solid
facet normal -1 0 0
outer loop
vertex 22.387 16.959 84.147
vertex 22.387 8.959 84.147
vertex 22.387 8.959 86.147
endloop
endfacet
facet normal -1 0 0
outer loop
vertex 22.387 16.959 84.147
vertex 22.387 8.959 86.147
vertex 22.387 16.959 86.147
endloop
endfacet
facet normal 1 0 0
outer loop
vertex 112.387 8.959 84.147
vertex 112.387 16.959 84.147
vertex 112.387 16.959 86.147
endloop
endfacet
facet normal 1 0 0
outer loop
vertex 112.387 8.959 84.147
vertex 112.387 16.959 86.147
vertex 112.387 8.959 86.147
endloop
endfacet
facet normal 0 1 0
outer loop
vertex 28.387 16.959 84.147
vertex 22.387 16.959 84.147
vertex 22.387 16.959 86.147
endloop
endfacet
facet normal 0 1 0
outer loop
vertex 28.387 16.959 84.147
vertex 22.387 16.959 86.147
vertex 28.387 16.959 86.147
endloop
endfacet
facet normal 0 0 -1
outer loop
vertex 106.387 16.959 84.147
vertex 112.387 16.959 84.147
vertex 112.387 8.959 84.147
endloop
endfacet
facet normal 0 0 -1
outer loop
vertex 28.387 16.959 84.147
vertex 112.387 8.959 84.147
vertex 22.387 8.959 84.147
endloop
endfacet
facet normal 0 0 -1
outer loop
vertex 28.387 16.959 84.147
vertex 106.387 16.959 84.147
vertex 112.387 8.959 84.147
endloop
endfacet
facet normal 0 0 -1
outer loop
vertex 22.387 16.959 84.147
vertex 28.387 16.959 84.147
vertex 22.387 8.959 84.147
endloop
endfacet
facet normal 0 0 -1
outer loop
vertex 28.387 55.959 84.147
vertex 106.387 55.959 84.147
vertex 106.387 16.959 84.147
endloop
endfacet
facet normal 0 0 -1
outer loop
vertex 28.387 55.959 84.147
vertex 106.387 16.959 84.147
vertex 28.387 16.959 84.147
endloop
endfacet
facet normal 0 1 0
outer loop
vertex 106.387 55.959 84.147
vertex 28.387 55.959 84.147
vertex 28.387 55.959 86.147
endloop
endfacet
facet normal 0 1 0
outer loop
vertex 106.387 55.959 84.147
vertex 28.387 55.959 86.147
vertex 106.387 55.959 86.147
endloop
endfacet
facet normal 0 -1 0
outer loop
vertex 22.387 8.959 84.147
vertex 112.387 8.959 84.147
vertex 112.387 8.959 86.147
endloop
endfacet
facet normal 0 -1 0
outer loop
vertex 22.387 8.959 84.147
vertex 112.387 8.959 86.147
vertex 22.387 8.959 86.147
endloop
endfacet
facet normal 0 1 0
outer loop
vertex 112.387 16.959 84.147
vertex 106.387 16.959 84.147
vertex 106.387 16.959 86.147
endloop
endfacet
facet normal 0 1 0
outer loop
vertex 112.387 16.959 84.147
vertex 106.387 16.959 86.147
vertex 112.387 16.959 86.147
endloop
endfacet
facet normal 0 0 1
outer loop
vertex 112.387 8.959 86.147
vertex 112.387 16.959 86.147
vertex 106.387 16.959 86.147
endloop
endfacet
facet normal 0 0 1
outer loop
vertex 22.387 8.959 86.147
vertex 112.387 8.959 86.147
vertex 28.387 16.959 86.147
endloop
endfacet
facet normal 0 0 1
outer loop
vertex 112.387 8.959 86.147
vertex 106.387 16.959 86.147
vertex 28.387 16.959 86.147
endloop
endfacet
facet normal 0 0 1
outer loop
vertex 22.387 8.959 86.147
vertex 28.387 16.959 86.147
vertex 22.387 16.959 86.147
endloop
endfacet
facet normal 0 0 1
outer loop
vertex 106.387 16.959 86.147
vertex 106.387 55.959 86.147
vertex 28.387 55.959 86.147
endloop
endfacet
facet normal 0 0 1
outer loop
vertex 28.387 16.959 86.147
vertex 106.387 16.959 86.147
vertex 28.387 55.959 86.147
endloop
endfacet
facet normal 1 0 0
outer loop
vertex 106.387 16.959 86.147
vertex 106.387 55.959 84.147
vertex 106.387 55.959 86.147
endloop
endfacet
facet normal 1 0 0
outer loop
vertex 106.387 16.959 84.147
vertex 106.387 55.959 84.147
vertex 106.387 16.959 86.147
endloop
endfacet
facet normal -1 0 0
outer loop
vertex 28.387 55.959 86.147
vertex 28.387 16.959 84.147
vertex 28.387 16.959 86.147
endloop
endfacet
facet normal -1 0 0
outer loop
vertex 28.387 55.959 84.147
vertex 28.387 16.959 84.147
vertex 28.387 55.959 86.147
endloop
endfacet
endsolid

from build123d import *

# Parameters (mm, degrees)
PAD_DEPTH = 2


with BuildPart() as part:
    # Sketch (on Face1 of CopyPad007) → Pad (new body)
    with BuildSketch(Plane.XY.offset(82)):
        Polygon((15, 4), (15, 12), (21, 12), (21, 51), (99, 51), (99, 12), (105, 12), (105, 4), align=None)
    extrude(amount=PAD_DEPTH)


with BuildPart() as part_1:
    # Body001 placement: moved
    add(part.part.moved(Location((7.386589, 4.959148, 2.147461))))


solid = part_1.part
